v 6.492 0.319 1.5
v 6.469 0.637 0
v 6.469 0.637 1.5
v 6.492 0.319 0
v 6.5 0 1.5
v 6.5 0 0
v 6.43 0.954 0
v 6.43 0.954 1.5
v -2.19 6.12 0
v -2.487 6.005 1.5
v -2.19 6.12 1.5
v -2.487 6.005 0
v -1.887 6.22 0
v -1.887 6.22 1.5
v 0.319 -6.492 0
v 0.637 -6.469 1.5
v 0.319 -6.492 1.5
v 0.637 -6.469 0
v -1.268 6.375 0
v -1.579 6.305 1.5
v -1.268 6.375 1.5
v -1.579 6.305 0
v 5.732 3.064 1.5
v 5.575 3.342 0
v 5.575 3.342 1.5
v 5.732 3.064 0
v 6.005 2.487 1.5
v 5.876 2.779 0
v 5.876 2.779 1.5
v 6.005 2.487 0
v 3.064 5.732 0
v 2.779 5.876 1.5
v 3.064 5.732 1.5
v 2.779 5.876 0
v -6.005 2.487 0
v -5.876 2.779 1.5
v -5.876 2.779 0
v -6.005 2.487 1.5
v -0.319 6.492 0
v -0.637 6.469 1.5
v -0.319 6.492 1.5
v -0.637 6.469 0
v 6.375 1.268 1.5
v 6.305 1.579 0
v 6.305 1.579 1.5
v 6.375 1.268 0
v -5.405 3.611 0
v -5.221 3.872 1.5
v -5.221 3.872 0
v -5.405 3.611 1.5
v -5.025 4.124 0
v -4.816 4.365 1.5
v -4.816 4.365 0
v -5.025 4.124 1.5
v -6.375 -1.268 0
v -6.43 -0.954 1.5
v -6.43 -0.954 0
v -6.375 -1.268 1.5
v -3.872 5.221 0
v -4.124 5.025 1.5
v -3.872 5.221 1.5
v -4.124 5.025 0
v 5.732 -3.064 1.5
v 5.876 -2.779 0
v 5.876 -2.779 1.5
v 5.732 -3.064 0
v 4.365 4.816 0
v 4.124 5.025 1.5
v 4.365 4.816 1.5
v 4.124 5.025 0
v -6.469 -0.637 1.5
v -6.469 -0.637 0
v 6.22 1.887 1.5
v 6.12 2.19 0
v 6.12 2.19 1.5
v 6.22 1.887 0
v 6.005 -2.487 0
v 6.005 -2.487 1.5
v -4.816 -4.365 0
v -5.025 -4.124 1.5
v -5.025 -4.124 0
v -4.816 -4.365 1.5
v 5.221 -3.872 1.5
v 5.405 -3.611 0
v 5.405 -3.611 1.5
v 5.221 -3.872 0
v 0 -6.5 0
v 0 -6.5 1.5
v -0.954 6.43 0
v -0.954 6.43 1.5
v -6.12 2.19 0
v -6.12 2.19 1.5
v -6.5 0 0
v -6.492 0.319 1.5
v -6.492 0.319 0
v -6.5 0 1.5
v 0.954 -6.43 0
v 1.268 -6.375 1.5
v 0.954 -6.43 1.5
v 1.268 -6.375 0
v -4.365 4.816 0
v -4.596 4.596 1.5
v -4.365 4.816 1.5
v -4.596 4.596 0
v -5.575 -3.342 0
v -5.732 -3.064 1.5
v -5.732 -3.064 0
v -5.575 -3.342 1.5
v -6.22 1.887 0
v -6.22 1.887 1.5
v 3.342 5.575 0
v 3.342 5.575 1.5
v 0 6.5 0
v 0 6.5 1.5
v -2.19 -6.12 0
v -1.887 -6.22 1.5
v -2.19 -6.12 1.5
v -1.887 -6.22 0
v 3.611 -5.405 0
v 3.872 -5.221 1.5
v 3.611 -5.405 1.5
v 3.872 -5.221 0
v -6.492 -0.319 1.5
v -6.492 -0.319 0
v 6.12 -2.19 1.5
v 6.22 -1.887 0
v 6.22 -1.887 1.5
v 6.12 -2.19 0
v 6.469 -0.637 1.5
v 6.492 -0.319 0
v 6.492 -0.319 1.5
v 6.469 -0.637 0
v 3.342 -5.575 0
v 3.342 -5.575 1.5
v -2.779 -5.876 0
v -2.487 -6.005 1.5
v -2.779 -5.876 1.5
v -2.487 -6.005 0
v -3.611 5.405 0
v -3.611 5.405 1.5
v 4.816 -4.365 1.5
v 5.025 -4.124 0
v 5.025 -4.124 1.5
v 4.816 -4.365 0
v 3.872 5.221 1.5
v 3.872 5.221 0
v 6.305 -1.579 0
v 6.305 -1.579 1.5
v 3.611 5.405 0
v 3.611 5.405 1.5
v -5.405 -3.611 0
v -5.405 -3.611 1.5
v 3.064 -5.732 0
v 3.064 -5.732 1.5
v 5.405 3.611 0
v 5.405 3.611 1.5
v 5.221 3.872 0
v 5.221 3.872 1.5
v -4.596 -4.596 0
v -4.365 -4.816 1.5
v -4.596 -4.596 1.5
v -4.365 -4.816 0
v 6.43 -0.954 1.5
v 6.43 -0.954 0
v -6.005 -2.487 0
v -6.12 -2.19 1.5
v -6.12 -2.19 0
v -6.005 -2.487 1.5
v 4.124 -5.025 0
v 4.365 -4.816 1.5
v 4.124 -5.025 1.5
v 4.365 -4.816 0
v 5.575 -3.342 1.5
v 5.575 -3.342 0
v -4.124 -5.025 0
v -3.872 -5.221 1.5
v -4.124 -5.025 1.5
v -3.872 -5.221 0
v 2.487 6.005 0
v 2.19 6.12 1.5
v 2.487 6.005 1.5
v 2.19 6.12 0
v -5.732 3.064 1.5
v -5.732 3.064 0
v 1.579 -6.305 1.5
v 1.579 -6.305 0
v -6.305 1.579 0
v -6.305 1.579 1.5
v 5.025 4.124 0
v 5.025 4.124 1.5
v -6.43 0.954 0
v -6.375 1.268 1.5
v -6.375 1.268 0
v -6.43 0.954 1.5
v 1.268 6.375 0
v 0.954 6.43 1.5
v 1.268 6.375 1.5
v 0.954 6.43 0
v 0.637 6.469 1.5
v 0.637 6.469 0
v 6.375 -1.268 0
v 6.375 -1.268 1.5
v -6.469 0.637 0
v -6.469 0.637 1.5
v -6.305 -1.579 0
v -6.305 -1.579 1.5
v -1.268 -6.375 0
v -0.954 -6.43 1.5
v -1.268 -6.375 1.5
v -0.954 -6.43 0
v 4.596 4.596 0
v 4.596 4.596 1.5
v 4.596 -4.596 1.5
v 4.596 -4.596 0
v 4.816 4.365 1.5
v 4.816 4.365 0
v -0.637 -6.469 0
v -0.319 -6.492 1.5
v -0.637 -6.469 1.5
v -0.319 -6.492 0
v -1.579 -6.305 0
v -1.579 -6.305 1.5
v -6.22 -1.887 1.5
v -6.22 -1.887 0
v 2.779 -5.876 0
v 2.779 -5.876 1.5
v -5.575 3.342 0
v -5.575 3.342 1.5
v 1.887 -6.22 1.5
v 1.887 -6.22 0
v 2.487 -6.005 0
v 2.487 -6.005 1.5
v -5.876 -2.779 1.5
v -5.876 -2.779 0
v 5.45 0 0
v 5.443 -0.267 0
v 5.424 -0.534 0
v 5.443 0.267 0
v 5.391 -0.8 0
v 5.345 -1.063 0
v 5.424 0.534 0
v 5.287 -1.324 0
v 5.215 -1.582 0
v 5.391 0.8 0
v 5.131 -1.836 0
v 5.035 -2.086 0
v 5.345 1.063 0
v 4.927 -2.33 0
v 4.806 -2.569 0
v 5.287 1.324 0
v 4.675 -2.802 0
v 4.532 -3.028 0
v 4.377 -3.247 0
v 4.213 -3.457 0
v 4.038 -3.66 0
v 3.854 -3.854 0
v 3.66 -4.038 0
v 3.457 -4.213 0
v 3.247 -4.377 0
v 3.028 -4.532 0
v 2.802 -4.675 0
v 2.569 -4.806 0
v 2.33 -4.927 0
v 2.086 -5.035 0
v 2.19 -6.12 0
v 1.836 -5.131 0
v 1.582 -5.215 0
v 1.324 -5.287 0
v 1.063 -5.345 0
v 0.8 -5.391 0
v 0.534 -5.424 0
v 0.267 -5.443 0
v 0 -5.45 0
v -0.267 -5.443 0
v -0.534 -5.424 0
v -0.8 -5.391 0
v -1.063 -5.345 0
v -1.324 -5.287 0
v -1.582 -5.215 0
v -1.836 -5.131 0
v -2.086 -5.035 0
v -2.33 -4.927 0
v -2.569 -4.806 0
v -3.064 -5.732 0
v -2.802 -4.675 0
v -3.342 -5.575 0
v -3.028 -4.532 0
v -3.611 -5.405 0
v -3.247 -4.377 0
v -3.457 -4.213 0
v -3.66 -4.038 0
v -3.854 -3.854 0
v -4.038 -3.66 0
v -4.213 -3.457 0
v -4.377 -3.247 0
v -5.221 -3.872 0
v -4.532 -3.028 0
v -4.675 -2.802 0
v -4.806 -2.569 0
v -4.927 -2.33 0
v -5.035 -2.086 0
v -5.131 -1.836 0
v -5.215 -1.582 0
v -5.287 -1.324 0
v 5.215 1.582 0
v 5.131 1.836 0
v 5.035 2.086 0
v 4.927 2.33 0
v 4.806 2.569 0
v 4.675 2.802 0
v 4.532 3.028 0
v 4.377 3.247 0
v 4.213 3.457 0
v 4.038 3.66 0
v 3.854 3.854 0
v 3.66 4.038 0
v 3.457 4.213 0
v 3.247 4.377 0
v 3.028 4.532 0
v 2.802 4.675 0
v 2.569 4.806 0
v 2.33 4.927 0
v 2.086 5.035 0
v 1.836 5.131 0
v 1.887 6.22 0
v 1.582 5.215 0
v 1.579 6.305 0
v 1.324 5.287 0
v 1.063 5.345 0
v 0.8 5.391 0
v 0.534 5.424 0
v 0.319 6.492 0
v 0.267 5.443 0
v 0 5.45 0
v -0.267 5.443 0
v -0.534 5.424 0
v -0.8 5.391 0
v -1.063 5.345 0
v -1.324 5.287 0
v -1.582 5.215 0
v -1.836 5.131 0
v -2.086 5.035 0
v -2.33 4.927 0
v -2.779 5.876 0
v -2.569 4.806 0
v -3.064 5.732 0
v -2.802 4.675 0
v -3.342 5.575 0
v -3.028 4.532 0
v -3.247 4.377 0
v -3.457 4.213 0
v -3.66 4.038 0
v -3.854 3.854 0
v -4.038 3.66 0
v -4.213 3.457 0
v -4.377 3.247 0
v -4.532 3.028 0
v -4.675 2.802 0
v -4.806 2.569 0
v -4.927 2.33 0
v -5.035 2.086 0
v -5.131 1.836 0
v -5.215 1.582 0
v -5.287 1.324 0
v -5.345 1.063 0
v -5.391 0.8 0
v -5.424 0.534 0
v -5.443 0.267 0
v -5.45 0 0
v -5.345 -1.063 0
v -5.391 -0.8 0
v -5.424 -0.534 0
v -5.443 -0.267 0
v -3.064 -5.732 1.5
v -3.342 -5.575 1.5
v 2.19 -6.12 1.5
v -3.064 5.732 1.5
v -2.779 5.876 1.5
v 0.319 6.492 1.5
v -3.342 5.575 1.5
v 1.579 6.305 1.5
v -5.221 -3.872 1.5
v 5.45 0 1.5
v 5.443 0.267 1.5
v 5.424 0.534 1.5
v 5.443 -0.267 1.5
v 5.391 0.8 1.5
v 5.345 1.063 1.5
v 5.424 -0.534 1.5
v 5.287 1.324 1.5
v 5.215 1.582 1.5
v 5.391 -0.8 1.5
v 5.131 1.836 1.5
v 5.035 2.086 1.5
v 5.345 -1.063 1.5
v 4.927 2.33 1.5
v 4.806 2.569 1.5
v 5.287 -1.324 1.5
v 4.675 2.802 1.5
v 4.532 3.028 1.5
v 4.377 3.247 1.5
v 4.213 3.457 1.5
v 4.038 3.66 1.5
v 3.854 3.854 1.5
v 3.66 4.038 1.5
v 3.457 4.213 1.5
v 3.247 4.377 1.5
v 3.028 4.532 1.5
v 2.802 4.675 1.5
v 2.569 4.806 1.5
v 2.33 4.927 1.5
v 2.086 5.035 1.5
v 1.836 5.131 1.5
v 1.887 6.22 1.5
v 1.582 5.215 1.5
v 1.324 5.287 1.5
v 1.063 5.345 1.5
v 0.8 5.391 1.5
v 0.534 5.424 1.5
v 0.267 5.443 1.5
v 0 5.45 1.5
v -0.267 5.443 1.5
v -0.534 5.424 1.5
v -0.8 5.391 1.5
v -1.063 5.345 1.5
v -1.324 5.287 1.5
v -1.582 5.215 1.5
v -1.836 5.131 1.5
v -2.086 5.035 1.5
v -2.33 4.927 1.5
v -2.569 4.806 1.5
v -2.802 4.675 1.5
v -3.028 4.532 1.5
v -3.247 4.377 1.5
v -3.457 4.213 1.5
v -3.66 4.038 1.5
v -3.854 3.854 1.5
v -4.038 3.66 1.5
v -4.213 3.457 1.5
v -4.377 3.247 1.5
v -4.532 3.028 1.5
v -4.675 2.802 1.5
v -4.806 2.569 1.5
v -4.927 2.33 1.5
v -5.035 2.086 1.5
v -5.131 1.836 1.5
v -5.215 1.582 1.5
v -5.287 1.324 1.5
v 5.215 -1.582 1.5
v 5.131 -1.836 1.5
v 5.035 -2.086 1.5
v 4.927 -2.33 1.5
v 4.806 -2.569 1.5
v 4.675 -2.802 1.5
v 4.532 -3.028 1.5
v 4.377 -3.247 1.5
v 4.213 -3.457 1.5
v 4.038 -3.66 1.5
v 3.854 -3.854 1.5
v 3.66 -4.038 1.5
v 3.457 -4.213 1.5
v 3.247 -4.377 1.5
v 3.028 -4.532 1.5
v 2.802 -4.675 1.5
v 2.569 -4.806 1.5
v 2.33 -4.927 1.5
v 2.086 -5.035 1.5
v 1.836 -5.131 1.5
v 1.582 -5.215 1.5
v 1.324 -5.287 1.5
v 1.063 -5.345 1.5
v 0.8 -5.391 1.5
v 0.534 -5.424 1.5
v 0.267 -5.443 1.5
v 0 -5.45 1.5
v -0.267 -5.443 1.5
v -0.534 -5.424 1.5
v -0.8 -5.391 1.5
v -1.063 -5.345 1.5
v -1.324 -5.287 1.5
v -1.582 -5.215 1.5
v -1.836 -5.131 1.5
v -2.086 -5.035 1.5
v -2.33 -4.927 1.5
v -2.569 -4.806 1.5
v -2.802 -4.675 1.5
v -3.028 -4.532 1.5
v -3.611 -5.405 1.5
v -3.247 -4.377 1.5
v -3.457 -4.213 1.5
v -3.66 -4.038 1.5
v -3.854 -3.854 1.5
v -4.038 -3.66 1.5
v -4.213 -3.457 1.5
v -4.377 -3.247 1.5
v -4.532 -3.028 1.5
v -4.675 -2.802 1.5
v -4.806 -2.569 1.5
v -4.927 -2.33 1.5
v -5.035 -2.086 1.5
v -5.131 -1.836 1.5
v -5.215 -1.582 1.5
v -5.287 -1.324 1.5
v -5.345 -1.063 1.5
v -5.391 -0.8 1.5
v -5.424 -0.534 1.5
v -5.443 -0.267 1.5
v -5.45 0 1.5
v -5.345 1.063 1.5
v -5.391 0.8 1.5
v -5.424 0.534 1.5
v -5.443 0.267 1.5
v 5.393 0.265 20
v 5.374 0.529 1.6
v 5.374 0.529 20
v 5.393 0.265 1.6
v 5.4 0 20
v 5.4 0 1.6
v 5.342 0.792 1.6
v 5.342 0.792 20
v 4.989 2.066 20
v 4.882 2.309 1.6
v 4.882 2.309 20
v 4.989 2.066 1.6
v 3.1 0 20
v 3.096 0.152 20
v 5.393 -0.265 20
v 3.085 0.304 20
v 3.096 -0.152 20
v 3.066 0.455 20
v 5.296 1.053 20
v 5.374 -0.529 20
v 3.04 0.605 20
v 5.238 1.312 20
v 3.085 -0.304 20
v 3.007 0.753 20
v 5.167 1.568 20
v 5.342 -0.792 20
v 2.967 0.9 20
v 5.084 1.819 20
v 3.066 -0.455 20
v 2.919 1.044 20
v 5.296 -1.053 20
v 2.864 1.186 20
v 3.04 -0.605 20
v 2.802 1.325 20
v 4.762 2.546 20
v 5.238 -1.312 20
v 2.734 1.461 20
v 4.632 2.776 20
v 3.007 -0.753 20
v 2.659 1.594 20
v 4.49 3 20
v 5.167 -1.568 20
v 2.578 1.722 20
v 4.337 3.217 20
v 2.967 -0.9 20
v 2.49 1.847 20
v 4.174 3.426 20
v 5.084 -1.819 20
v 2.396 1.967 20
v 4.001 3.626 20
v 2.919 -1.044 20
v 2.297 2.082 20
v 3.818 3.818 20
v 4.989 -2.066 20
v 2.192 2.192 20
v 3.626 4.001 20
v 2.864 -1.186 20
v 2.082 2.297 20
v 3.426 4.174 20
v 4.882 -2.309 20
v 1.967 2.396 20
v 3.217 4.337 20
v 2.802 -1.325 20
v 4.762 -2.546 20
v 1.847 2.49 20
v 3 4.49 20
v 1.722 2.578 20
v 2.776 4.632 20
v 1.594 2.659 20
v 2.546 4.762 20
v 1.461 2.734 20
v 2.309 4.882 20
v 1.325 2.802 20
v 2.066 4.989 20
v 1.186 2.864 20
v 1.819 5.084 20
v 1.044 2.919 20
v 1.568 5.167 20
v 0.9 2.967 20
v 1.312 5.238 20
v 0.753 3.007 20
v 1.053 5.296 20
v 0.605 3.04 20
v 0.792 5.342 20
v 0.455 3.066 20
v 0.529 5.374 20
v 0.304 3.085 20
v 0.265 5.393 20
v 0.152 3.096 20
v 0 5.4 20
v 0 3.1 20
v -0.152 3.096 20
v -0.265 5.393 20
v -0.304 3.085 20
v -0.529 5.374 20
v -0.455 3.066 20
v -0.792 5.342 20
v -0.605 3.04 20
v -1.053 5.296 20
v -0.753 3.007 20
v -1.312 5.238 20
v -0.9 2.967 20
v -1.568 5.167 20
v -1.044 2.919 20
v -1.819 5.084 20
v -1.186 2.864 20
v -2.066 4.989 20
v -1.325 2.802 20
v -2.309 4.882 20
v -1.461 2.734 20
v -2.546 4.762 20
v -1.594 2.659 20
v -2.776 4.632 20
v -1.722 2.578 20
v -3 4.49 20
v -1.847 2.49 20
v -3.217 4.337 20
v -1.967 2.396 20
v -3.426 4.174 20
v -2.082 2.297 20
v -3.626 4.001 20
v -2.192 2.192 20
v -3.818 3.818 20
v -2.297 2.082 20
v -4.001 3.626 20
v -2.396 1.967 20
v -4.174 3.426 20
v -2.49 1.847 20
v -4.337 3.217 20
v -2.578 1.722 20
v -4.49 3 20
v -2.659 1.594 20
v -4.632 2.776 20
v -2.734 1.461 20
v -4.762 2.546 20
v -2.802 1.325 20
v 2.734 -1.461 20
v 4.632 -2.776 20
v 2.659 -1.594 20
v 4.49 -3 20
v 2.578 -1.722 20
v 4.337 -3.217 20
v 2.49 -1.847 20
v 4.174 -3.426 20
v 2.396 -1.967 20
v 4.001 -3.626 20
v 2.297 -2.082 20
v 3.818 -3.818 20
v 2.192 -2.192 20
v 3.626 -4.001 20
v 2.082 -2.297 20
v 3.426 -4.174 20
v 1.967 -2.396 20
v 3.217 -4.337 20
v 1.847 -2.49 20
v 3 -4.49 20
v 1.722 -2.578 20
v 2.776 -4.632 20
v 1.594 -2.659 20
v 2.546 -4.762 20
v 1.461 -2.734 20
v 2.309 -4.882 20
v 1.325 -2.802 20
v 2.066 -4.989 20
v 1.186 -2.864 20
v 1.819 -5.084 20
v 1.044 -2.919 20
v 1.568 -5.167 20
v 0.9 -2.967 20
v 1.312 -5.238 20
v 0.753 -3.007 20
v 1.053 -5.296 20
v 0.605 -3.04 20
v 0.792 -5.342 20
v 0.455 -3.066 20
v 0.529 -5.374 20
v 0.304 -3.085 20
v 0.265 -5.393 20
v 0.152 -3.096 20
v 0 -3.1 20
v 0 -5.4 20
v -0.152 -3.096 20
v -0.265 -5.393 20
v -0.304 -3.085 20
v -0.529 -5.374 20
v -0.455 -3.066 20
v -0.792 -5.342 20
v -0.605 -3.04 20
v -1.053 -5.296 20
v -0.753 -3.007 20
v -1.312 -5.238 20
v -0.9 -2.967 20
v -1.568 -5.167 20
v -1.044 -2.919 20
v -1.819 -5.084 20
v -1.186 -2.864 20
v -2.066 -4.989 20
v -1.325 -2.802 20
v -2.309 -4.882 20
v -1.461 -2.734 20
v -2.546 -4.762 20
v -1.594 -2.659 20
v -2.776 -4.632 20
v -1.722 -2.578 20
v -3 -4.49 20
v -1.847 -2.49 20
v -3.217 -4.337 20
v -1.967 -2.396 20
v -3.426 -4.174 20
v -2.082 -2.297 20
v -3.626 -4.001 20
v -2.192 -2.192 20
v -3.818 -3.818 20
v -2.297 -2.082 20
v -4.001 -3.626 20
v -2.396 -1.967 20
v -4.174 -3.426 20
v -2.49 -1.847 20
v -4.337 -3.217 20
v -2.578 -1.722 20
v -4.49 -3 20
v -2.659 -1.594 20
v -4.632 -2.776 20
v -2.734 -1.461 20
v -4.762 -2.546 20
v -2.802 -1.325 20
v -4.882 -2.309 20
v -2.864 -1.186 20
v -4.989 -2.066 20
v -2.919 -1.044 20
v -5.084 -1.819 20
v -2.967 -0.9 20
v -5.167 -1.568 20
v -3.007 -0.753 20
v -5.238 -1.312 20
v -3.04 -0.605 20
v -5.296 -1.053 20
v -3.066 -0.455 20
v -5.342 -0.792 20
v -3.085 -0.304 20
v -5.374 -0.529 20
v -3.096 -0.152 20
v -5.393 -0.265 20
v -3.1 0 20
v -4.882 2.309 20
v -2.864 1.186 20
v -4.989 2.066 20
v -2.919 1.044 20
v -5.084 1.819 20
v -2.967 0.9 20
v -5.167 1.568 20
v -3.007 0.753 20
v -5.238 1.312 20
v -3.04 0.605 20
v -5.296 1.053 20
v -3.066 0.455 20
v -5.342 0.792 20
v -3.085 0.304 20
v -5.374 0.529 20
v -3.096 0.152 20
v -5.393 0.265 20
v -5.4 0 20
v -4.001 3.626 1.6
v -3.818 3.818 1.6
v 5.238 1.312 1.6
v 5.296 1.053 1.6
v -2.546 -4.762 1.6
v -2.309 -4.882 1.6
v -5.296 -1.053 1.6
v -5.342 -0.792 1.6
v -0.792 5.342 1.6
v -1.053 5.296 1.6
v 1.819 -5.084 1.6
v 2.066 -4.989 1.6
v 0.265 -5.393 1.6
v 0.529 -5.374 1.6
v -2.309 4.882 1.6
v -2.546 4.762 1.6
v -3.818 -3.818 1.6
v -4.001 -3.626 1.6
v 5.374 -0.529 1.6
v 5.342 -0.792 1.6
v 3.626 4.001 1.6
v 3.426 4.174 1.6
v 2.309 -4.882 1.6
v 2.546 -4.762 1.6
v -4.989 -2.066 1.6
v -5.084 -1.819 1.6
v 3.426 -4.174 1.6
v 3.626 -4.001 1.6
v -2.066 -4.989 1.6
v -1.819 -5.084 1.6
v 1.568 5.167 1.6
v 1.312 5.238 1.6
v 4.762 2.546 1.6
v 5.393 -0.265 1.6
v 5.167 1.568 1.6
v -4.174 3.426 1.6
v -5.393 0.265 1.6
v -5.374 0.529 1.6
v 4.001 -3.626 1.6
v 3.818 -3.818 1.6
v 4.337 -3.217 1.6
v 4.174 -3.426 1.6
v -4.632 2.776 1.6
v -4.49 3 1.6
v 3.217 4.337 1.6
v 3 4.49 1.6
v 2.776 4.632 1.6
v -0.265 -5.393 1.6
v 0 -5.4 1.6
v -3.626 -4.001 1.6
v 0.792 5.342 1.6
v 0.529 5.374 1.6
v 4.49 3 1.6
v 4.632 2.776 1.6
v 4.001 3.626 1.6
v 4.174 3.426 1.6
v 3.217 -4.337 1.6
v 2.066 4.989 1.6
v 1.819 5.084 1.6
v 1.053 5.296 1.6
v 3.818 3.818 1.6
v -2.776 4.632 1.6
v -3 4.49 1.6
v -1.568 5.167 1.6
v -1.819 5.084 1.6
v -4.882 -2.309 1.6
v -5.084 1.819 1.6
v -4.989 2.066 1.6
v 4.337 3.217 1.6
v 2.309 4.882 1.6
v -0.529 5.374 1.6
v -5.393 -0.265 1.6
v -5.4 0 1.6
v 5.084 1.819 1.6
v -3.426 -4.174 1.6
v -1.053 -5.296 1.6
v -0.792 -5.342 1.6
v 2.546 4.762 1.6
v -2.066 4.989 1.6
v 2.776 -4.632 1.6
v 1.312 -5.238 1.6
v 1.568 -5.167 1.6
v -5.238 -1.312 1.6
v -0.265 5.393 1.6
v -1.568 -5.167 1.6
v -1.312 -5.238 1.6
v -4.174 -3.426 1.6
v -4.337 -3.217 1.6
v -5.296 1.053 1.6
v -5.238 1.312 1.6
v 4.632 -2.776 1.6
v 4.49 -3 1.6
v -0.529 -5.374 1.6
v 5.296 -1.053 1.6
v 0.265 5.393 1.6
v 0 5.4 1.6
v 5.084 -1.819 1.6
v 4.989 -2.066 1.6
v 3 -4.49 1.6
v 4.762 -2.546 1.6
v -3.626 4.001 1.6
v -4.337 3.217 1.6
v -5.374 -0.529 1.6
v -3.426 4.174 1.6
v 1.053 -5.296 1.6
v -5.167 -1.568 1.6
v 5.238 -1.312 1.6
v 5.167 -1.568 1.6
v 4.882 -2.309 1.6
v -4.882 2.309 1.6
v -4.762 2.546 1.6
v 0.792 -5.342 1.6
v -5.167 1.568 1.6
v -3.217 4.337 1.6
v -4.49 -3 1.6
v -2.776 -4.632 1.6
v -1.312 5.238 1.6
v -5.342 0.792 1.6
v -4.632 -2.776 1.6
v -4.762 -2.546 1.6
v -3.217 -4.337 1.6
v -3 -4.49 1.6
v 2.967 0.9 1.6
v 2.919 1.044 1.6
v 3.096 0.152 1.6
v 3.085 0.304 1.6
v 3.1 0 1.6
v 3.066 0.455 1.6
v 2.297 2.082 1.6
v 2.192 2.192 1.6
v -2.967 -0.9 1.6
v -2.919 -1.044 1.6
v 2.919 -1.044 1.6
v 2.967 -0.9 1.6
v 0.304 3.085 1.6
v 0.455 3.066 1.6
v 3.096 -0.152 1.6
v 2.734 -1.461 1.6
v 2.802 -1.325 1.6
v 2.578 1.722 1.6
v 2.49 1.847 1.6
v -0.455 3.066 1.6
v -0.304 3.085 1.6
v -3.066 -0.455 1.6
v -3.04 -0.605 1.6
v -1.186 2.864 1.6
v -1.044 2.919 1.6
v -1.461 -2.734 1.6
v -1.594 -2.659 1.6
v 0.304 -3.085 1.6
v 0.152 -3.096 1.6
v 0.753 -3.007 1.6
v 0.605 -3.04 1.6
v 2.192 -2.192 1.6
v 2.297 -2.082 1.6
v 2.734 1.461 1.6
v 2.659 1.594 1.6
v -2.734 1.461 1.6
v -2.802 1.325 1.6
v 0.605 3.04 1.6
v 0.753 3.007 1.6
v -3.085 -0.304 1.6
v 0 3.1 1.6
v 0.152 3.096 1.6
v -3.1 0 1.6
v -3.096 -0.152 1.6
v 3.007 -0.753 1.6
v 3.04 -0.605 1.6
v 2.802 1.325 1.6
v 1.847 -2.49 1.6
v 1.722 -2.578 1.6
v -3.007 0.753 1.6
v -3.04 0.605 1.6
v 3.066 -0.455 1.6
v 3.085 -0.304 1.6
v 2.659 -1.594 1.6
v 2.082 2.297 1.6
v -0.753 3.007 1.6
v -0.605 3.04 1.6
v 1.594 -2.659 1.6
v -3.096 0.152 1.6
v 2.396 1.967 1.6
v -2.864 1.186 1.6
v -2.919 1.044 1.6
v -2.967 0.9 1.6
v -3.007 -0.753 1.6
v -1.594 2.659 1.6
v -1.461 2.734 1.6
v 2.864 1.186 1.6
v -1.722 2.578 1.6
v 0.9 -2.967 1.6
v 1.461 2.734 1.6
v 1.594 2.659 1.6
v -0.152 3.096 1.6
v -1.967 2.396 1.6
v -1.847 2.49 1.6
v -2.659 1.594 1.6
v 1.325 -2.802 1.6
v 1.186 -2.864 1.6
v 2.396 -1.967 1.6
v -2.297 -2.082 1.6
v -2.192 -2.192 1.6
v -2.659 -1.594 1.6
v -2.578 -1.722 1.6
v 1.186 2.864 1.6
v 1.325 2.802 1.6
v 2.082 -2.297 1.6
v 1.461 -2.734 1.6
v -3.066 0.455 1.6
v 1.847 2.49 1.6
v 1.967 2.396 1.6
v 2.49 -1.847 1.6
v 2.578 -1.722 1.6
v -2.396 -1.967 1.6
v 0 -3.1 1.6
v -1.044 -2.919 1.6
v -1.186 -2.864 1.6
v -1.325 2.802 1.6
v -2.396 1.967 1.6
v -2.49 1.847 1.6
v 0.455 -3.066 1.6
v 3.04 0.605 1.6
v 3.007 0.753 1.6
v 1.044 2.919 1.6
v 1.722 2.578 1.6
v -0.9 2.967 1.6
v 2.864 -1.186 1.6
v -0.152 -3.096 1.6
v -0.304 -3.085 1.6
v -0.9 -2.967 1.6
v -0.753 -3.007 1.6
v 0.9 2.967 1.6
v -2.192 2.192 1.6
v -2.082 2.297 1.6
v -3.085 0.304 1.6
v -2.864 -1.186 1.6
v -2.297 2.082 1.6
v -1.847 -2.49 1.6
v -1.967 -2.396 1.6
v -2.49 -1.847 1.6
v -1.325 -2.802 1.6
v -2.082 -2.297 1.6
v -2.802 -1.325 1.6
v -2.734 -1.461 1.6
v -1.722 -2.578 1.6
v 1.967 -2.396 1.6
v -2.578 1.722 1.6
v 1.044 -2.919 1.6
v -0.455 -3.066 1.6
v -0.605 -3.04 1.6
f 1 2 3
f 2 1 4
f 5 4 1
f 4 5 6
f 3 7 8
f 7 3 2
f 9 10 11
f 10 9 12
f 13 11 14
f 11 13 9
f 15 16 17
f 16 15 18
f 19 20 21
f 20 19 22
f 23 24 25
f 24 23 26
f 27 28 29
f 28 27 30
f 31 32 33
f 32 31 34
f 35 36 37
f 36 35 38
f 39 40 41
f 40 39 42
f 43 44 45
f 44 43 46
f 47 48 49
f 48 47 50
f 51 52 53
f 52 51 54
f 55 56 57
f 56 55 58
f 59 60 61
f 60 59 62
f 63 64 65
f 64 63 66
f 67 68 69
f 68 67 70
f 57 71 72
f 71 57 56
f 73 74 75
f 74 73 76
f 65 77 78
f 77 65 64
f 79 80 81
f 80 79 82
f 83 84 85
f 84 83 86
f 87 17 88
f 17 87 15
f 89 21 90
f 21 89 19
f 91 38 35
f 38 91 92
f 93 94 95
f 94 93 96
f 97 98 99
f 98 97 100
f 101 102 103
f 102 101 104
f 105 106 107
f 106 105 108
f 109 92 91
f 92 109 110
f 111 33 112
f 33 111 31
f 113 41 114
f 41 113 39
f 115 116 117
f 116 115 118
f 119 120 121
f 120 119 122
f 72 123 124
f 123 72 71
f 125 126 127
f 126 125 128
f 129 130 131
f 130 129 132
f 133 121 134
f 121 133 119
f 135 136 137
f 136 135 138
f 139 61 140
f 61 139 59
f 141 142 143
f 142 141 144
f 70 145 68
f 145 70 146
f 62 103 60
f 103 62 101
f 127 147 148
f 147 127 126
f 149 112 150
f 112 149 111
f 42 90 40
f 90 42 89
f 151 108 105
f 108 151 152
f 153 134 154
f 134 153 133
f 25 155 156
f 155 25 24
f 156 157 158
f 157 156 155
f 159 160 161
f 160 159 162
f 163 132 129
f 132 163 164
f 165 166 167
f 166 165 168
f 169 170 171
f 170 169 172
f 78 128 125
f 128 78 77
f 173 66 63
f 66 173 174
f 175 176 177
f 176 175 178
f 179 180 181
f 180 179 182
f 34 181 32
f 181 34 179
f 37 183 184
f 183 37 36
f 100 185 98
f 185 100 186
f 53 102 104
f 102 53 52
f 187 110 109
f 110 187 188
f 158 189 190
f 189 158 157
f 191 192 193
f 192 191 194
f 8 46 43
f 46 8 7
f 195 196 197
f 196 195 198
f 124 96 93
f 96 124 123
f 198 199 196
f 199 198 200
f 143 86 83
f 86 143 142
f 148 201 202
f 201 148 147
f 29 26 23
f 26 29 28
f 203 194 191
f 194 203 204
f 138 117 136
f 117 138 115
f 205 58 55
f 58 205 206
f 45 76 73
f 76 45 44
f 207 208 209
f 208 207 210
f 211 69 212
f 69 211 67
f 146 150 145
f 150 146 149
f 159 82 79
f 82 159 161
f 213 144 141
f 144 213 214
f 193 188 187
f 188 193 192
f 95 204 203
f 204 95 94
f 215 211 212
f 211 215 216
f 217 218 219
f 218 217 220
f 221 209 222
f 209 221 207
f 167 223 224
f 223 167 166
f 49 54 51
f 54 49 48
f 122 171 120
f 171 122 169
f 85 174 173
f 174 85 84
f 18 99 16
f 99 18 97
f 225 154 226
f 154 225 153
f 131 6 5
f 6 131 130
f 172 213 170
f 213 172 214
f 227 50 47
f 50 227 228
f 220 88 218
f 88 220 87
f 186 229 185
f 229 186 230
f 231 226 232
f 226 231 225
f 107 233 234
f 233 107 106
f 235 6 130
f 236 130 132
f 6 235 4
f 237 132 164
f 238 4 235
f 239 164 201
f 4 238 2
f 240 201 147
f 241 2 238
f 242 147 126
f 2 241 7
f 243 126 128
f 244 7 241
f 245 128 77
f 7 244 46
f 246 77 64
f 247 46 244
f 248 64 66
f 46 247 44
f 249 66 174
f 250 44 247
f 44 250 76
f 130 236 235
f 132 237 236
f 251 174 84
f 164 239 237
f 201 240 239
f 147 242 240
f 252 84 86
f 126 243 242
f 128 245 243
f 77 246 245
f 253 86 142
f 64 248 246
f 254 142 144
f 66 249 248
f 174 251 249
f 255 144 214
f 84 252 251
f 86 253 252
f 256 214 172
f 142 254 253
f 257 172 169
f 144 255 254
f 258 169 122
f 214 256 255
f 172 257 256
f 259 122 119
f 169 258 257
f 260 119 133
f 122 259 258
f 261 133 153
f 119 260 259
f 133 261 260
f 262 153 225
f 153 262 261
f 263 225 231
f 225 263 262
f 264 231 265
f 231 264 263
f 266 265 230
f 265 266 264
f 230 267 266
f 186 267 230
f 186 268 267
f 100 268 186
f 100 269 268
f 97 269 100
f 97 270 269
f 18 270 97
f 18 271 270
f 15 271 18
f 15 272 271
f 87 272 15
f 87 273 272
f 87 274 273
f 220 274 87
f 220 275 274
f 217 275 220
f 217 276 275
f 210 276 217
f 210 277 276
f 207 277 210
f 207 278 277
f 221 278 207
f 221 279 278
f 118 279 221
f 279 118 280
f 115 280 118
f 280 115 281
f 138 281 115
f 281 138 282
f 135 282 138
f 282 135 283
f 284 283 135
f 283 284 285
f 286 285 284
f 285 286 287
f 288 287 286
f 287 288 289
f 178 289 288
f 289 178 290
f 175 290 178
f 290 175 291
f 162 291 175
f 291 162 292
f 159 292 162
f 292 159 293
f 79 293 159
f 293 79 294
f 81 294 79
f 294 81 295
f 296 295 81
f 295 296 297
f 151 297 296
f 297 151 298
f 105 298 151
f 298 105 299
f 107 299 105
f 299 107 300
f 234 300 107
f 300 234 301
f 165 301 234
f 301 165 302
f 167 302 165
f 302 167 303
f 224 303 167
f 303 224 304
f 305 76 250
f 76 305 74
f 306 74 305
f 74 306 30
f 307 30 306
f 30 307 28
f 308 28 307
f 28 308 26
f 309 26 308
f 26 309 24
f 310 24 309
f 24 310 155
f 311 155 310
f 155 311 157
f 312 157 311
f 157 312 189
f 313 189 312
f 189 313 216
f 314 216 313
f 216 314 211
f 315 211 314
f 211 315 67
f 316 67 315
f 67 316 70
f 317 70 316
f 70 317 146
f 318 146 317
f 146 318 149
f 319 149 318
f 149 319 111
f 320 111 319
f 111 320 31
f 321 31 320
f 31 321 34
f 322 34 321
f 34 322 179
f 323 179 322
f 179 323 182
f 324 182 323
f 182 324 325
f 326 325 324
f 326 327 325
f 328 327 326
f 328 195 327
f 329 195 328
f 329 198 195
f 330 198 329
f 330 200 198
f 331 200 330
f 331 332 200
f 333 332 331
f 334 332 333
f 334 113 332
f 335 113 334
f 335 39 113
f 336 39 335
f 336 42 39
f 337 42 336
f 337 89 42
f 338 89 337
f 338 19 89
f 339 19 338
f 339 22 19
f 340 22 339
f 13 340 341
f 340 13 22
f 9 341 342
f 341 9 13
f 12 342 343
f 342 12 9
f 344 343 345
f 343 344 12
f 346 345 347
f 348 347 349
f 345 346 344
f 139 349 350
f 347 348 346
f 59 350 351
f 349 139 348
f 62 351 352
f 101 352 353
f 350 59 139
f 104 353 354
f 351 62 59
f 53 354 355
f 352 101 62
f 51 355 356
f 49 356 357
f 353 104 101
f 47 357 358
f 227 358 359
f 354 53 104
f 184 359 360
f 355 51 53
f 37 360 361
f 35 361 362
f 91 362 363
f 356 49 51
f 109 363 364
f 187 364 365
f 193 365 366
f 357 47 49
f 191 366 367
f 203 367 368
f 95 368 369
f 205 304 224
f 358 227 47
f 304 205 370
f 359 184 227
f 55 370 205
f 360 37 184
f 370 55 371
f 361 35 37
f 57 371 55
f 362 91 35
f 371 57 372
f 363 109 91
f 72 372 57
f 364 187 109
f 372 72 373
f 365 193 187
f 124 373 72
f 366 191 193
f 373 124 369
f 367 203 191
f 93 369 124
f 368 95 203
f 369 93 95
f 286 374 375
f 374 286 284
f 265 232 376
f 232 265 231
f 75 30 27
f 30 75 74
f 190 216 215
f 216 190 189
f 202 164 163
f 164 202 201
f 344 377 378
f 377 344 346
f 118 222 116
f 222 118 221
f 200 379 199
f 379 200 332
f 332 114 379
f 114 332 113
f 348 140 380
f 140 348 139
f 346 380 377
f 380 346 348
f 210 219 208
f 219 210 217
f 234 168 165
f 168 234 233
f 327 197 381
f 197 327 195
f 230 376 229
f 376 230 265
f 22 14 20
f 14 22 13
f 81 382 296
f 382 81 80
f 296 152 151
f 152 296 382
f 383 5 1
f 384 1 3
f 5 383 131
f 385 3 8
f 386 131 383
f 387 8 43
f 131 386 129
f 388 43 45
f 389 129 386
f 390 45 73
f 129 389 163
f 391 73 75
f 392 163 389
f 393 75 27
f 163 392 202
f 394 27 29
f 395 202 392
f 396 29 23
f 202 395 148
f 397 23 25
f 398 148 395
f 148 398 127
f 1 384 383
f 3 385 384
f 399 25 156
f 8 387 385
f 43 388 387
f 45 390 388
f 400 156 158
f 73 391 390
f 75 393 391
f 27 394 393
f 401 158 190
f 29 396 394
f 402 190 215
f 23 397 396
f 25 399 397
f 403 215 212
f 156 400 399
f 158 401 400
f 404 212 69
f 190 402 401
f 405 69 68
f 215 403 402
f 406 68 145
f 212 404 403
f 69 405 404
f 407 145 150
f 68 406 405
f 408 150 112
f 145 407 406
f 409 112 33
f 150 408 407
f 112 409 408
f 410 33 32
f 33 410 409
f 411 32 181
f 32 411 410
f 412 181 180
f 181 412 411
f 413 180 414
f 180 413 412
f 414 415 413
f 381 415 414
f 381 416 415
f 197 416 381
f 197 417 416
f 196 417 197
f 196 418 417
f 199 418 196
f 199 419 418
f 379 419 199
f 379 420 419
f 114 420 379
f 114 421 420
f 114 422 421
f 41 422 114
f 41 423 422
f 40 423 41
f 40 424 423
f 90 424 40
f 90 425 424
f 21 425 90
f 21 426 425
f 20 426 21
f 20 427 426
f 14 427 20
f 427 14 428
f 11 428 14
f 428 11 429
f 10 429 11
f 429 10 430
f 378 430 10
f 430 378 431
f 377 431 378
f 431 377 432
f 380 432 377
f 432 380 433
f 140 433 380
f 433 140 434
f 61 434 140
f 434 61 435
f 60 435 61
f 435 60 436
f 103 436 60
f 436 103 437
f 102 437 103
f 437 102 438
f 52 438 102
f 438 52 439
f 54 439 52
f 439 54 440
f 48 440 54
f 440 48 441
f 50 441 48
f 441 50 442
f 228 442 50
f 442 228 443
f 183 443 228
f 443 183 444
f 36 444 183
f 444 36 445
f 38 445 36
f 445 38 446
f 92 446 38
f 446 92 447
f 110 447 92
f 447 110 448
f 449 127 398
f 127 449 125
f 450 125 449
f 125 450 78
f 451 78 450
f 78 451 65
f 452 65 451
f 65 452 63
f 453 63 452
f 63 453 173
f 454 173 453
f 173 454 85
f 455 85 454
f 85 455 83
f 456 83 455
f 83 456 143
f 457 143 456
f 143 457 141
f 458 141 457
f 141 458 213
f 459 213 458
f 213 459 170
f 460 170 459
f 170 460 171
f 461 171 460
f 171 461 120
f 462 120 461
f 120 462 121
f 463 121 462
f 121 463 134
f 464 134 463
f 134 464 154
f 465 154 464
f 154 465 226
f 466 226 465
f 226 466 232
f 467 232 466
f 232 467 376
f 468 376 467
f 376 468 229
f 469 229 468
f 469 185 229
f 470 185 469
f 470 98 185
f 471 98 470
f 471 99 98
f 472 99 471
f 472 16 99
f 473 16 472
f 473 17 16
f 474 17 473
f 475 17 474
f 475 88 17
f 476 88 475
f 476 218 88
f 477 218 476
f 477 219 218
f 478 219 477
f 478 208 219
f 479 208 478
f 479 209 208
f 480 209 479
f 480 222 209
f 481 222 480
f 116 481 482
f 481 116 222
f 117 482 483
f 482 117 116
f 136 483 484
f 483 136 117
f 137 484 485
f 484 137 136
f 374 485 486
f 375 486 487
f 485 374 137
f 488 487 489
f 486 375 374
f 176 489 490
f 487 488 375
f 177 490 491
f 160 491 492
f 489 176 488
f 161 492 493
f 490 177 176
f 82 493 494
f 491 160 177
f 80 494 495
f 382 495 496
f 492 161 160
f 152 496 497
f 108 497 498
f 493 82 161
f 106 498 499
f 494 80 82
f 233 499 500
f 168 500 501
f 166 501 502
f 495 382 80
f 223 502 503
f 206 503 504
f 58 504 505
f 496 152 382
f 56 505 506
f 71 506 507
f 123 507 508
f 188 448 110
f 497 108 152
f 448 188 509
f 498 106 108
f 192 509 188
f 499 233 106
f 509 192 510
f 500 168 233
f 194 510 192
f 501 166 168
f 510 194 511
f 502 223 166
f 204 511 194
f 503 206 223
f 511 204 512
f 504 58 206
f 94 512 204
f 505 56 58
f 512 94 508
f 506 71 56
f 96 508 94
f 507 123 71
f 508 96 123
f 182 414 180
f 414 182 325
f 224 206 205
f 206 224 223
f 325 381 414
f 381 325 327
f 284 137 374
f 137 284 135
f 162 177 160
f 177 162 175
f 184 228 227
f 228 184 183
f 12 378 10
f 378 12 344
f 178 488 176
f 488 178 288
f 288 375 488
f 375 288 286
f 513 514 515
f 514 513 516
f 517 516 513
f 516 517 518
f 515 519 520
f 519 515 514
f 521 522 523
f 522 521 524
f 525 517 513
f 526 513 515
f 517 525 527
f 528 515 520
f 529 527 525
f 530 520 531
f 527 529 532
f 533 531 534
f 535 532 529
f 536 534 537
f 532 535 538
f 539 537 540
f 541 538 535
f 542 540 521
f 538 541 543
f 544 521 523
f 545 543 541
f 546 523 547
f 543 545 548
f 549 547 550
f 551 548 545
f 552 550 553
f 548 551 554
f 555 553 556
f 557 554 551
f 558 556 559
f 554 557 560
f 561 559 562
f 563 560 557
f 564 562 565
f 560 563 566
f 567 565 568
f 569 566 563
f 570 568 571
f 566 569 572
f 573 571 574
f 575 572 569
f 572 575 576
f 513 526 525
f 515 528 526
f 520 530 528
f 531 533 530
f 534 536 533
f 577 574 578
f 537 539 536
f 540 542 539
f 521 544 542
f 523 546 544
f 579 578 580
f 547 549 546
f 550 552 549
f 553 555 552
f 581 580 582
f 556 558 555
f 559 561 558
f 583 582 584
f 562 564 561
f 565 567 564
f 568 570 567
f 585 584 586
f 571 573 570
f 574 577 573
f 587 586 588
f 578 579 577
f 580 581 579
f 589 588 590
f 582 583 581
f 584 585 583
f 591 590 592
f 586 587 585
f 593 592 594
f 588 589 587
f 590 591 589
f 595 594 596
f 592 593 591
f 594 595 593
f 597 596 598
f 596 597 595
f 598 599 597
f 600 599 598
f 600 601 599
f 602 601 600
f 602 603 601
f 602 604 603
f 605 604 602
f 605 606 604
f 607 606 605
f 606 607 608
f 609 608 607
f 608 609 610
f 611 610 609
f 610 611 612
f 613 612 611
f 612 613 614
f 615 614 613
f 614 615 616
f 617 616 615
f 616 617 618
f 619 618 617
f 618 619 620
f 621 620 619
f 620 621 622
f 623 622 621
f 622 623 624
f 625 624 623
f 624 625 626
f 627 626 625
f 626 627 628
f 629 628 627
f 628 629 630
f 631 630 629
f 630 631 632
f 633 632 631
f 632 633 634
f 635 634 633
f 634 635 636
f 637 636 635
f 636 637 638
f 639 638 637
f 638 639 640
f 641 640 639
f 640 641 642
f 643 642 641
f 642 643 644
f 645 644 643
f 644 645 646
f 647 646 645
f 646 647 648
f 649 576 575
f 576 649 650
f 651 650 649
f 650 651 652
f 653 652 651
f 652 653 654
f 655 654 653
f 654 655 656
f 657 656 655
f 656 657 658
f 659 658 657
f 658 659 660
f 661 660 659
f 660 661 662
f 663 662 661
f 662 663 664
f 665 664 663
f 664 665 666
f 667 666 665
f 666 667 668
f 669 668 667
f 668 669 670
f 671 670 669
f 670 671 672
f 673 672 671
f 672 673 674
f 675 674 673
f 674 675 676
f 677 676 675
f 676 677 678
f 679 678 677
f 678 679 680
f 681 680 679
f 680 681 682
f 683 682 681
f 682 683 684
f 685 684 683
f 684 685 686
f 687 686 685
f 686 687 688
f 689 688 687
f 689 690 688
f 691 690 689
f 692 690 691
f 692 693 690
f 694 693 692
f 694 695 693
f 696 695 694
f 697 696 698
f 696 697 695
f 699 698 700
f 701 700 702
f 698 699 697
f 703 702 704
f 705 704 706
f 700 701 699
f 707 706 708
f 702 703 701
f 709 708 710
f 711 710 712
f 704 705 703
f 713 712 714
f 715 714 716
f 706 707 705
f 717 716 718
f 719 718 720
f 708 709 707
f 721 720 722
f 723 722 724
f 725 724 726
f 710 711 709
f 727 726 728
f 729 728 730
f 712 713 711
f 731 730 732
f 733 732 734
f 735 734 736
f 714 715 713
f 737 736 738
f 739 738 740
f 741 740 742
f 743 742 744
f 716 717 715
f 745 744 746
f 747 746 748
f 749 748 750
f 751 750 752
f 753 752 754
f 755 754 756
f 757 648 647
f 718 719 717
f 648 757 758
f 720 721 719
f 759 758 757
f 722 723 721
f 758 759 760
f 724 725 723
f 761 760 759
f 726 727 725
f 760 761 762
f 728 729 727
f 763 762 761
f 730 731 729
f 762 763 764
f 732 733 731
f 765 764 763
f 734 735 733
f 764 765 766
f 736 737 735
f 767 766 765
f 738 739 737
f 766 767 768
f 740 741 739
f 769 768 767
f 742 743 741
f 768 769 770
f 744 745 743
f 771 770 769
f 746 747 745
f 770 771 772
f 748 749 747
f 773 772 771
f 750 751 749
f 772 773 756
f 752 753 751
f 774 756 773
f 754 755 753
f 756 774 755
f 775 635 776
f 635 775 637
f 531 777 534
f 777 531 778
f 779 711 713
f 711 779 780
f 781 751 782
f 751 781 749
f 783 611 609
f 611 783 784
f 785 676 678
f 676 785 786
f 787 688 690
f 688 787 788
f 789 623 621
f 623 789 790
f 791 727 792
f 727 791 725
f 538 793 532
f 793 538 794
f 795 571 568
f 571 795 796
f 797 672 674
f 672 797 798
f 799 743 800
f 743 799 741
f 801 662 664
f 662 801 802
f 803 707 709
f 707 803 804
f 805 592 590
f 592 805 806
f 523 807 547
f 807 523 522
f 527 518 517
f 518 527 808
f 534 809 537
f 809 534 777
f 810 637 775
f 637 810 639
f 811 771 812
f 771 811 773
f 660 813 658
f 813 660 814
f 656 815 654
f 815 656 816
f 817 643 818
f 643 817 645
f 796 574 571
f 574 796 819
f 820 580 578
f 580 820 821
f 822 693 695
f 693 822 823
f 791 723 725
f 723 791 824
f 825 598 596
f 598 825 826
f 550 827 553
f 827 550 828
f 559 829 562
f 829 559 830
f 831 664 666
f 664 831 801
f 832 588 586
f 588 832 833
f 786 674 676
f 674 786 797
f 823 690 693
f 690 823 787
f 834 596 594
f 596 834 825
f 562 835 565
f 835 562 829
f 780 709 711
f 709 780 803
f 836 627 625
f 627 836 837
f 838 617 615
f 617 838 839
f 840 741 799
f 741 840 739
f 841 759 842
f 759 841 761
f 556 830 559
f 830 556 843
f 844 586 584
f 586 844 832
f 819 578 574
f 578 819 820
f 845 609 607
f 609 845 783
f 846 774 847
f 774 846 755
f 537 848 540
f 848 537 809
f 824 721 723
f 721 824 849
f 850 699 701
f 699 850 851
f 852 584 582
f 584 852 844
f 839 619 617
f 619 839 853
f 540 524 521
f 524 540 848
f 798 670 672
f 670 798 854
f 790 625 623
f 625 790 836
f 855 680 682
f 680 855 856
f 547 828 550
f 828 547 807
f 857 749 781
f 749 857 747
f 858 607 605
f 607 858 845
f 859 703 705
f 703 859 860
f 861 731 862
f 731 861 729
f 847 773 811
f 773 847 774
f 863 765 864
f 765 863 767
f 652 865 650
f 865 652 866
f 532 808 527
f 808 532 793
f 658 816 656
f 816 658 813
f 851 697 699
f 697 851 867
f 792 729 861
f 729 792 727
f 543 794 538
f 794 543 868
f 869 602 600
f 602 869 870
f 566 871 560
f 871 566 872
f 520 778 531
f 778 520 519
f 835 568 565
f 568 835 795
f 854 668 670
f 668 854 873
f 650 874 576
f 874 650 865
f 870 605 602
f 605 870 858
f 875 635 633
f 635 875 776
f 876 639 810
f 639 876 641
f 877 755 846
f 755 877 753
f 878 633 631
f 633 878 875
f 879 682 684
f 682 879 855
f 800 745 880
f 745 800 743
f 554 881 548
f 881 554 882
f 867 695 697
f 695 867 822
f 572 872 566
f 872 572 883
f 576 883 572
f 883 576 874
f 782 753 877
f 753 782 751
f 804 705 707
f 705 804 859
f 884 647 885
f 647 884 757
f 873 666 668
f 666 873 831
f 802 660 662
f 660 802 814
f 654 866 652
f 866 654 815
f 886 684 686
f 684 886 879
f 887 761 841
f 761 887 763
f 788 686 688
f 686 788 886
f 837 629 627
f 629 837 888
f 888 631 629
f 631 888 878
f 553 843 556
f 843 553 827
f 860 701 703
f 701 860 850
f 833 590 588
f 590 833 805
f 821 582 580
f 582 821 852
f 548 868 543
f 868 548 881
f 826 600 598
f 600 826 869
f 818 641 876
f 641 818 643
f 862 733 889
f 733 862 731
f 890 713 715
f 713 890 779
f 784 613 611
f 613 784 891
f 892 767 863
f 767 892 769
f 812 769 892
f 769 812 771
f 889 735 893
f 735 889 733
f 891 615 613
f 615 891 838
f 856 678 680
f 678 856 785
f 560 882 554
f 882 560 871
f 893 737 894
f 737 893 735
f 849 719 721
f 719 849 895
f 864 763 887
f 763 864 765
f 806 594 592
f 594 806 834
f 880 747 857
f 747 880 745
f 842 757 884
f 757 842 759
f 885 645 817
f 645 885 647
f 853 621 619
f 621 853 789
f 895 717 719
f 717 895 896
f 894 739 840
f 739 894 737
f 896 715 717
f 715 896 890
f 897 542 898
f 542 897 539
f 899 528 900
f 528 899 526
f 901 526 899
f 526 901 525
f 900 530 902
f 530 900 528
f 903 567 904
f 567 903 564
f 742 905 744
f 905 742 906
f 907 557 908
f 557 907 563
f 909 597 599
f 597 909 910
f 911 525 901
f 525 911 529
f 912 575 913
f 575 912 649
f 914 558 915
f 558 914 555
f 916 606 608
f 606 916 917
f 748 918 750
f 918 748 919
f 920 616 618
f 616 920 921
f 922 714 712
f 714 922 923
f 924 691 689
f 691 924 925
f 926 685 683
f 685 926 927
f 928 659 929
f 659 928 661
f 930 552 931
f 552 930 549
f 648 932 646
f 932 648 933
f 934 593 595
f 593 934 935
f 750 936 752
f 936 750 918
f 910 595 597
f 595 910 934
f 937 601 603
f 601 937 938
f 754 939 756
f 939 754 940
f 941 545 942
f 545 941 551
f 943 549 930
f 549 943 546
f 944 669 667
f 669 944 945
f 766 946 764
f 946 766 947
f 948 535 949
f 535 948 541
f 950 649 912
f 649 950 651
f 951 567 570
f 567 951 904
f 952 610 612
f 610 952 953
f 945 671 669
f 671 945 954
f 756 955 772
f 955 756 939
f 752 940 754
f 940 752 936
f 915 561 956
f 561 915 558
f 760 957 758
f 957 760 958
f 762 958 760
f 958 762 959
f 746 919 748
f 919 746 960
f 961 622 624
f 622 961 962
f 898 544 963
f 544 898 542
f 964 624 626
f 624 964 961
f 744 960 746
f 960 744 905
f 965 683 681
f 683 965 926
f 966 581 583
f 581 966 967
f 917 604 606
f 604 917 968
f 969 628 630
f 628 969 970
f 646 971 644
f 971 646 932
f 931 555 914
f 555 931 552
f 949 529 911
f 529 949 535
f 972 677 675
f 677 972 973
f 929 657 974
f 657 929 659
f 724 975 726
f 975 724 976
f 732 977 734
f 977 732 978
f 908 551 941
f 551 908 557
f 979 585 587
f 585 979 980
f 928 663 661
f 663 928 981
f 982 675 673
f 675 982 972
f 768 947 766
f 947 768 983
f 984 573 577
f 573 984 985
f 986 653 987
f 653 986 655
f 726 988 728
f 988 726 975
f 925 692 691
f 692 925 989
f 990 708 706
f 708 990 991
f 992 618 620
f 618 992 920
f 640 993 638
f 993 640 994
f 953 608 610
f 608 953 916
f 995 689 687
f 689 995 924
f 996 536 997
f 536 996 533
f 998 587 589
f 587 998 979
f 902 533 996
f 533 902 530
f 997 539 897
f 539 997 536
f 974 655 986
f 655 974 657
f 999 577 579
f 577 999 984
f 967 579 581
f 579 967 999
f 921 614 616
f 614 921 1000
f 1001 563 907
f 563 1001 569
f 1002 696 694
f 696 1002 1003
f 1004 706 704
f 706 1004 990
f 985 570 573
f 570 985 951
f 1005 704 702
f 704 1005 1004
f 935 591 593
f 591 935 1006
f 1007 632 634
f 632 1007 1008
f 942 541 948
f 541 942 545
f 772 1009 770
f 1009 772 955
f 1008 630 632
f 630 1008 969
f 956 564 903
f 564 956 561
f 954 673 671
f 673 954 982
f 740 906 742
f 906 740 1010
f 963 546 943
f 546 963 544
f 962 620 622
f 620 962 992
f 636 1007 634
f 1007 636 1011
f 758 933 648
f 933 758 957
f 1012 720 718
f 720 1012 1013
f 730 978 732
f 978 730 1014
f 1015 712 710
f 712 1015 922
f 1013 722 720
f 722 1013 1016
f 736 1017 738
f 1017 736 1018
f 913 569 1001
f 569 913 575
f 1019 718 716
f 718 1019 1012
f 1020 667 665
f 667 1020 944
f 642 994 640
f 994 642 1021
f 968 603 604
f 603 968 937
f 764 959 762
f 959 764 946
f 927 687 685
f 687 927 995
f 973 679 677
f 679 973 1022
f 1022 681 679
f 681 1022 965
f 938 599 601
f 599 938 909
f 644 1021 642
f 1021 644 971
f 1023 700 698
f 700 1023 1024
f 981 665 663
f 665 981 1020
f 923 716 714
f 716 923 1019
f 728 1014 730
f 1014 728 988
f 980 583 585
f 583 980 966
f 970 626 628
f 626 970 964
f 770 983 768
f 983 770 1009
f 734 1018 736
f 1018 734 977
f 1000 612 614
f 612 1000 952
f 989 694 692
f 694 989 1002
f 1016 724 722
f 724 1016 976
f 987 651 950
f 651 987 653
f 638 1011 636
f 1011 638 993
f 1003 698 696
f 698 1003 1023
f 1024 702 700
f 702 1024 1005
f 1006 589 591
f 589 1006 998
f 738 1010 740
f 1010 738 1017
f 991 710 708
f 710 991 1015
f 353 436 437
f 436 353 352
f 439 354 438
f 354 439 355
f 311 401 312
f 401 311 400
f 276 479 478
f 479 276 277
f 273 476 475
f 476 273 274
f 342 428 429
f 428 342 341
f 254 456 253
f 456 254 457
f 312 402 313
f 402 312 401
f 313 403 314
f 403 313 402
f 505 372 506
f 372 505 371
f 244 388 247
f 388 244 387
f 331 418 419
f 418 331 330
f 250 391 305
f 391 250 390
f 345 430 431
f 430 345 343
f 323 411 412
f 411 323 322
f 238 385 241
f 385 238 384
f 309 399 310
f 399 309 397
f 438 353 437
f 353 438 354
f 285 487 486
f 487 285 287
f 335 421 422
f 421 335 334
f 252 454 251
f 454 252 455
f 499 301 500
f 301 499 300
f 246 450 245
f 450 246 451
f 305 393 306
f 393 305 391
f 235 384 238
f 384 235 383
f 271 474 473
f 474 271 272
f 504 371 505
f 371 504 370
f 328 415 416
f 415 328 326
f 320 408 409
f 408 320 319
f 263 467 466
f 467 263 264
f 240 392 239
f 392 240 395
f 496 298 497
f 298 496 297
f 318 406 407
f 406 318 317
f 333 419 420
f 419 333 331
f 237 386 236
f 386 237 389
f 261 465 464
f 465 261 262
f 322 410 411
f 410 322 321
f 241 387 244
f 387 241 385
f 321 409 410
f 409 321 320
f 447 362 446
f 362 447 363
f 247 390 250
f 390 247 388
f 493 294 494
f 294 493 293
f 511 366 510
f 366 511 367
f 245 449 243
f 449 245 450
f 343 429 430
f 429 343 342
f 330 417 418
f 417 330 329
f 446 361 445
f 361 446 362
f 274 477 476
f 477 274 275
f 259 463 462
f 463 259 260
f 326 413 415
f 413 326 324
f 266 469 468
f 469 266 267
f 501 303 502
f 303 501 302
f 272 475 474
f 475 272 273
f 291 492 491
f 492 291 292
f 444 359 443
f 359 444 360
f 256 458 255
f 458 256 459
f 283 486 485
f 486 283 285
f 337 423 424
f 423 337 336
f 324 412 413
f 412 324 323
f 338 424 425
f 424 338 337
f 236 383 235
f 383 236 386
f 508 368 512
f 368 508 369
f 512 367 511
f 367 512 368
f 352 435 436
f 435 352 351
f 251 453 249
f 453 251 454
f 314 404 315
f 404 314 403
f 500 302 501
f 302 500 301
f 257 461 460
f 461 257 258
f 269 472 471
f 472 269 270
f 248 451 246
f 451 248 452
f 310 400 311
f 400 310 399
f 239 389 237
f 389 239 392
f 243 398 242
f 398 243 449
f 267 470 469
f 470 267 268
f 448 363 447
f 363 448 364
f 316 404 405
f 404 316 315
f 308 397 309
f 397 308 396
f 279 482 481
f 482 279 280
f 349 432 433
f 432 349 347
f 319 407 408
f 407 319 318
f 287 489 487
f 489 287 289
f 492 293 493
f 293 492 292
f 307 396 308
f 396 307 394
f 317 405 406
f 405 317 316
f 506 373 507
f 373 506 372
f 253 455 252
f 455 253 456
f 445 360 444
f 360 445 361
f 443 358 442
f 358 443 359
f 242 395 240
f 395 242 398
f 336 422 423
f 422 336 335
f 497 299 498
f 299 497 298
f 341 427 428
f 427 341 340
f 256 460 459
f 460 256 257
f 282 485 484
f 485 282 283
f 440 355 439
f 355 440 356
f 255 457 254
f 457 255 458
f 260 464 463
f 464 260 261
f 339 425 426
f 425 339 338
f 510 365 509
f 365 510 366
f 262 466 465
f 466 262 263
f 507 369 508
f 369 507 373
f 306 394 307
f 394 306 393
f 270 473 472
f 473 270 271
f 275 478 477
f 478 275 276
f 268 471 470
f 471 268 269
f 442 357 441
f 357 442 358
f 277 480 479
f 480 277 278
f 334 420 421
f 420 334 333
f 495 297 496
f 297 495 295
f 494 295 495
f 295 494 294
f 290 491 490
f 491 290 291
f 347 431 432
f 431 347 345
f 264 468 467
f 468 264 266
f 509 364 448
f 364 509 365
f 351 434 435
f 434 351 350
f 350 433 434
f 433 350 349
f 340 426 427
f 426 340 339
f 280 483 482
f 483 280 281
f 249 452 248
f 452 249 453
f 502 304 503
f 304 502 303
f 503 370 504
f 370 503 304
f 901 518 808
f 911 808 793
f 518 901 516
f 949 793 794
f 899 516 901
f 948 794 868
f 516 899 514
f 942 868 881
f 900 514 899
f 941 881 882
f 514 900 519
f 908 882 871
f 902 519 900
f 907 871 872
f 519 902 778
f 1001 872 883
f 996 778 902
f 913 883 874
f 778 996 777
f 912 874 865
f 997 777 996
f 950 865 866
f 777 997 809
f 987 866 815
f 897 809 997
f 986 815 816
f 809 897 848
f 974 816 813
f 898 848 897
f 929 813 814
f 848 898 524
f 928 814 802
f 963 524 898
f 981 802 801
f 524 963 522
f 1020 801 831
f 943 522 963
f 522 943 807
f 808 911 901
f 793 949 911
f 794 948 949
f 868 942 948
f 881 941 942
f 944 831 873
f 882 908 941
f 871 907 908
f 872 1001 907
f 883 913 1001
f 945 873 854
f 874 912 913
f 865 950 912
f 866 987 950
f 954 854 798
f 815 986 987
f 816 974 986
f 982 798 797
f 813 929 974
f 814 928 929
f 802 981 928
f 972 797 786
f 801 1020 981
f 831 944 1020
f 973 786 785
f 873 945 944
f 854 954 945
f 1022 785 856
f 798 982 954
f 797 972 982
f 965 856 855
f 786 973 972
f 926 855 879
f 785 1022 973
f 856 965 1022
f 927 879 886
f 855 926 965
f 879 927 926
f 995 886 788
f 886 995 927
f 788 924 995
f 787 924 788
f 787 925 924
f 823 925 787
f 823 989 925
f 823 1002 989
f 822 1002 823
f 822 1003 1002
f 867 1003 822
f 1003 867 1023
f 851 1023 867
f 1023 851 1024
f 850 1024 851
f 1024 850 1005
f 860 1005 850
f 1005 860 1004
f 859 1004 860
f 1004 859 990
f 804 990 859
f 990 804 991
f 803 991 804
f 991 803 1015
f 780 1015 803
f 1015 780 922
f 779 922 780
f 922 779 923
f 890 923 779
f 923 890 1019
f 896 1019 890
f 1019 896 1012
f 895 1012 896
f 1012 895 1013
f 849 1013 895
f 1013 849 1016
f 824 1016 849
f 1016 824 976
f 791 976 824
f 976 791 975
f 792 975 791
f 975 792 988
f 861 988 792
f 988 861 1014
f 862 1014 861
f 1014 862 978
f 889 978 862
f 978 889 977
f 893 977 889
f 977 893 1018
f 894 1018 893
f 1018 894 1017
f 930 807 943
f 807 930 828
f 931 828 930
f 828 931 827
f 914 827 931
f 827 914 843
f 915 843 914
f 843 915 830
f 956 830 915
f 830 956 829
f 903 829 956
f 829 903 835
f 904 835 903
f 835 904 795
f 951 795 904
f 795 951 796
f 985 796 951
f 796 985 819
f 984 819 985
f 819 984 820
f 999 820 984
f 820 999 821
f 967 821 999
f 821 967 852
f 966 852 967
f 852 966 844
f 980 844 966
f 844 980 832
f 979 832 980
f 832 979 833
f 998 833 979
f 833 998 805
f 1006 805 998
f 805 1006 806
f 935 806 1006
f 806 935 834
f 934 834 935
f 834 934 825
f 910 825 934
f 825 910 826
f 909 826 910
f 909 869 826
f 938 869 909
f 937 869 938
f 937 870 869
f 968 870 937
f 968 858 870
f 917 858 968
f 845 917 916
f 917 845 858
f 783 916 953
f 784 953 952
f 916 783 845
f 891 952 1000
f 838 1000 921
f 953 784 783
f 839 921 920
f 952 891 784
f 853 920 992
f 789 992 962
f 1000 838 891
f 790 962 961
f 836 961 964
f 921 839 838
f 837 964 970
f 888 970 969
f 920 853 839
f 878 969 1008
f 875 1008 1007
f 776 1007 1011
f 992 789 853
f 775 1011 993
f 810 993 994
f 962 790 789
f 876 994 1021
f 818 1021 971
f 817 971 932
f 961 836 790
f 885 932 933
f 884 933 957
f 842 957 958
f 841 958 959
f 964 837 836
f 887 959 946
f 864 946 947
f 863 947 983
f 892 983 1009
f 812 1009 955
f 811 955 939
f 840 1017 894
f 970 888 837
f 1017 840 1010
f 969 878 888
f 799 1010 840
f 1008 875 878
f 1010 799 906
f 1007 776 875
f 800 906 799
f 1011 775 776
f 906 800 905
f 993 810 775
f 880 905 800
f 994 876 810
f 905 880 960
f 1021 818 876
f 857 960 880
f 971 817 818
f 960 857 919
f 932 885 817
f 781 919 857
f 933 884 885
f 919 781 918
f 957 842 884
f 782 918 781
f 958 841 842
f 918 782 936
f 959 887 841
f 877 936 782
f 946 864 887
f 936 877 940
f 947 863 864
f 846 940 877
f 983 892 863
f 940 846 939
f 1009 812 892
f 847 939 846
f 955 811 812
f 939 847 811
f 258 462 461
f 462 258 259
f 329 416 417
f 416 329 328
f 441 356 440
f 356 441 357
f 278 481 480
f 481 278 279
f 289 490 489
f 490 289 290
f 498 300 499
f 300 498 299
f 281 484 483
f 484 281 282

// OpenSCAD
// Adapter Sleeve for 0.2mL PCR Tube in 1.5mL Rack
// Print Orientation: Upside down (Collar on bed)
// Units: mm

// --- Dimensions ---
$fn = 128; // High resolution for smooth curves and accurate holes

// Collar (Base)
$collar_outer_diameter = 13.0;
$collar_thickness = 1.5;

// Sleeve Body
$sleeve_outer_diameter = 10.8;
$sleeve_total_height = 21.5;
$sleeve_inner_diameter = 6.2;

// --- Calculated Variables ---
$collar_radius = $collar_outer_diameter / 2;
$sleeve_outer_radius = $sleeve_outer_diameter / 2;
$sleeve_inner_radius = $sleeve_inner_diameter / 2;
$sleeve_body_height = $sleeve_total_height - $collar_thickness;

// --- Main Part ---
difference() {
    // 1. Create the outer solid shape
    union() {
        // Collar (Lies on Z=0)
        cylinder(
            h = $collar_thickness,
            r = $collar_radius,
            center = [0, 0, $collar_thickness / 2]
        );
        
        // Sleeve Body (Rises from top of collar)
        cylinder(
            h = $sleeve_body_height,
            r = $sleeve_outer_radius,
            center = [0, 0, $collar_thickness + $sleeve_body_height / 2]
        );
    }
    
    // 2. Cut the central bore through the full height
    // Total height = collar thickness + sleeve body height
    cylinder(
        h = $sleeve_total_height,
        r = $sleeve_inner_radius,
        center = [0, 0, $sleeve_total_height / 2]
    );
    
    // 3. Cut the collar outer rim to match the sleeve outer diameter
    // This creates the step down from collar to sleeve
    cylinder(
        h = $collar_thickness + 0.1, // Extend slightly past collar top to ensure clean cut
        r = ($sleeve_outer_diameter / 2) + 0.05, // Extend slightly past sleeve outer radius
        center = [0, 0, $collar_thickness / 2]
    );
}
